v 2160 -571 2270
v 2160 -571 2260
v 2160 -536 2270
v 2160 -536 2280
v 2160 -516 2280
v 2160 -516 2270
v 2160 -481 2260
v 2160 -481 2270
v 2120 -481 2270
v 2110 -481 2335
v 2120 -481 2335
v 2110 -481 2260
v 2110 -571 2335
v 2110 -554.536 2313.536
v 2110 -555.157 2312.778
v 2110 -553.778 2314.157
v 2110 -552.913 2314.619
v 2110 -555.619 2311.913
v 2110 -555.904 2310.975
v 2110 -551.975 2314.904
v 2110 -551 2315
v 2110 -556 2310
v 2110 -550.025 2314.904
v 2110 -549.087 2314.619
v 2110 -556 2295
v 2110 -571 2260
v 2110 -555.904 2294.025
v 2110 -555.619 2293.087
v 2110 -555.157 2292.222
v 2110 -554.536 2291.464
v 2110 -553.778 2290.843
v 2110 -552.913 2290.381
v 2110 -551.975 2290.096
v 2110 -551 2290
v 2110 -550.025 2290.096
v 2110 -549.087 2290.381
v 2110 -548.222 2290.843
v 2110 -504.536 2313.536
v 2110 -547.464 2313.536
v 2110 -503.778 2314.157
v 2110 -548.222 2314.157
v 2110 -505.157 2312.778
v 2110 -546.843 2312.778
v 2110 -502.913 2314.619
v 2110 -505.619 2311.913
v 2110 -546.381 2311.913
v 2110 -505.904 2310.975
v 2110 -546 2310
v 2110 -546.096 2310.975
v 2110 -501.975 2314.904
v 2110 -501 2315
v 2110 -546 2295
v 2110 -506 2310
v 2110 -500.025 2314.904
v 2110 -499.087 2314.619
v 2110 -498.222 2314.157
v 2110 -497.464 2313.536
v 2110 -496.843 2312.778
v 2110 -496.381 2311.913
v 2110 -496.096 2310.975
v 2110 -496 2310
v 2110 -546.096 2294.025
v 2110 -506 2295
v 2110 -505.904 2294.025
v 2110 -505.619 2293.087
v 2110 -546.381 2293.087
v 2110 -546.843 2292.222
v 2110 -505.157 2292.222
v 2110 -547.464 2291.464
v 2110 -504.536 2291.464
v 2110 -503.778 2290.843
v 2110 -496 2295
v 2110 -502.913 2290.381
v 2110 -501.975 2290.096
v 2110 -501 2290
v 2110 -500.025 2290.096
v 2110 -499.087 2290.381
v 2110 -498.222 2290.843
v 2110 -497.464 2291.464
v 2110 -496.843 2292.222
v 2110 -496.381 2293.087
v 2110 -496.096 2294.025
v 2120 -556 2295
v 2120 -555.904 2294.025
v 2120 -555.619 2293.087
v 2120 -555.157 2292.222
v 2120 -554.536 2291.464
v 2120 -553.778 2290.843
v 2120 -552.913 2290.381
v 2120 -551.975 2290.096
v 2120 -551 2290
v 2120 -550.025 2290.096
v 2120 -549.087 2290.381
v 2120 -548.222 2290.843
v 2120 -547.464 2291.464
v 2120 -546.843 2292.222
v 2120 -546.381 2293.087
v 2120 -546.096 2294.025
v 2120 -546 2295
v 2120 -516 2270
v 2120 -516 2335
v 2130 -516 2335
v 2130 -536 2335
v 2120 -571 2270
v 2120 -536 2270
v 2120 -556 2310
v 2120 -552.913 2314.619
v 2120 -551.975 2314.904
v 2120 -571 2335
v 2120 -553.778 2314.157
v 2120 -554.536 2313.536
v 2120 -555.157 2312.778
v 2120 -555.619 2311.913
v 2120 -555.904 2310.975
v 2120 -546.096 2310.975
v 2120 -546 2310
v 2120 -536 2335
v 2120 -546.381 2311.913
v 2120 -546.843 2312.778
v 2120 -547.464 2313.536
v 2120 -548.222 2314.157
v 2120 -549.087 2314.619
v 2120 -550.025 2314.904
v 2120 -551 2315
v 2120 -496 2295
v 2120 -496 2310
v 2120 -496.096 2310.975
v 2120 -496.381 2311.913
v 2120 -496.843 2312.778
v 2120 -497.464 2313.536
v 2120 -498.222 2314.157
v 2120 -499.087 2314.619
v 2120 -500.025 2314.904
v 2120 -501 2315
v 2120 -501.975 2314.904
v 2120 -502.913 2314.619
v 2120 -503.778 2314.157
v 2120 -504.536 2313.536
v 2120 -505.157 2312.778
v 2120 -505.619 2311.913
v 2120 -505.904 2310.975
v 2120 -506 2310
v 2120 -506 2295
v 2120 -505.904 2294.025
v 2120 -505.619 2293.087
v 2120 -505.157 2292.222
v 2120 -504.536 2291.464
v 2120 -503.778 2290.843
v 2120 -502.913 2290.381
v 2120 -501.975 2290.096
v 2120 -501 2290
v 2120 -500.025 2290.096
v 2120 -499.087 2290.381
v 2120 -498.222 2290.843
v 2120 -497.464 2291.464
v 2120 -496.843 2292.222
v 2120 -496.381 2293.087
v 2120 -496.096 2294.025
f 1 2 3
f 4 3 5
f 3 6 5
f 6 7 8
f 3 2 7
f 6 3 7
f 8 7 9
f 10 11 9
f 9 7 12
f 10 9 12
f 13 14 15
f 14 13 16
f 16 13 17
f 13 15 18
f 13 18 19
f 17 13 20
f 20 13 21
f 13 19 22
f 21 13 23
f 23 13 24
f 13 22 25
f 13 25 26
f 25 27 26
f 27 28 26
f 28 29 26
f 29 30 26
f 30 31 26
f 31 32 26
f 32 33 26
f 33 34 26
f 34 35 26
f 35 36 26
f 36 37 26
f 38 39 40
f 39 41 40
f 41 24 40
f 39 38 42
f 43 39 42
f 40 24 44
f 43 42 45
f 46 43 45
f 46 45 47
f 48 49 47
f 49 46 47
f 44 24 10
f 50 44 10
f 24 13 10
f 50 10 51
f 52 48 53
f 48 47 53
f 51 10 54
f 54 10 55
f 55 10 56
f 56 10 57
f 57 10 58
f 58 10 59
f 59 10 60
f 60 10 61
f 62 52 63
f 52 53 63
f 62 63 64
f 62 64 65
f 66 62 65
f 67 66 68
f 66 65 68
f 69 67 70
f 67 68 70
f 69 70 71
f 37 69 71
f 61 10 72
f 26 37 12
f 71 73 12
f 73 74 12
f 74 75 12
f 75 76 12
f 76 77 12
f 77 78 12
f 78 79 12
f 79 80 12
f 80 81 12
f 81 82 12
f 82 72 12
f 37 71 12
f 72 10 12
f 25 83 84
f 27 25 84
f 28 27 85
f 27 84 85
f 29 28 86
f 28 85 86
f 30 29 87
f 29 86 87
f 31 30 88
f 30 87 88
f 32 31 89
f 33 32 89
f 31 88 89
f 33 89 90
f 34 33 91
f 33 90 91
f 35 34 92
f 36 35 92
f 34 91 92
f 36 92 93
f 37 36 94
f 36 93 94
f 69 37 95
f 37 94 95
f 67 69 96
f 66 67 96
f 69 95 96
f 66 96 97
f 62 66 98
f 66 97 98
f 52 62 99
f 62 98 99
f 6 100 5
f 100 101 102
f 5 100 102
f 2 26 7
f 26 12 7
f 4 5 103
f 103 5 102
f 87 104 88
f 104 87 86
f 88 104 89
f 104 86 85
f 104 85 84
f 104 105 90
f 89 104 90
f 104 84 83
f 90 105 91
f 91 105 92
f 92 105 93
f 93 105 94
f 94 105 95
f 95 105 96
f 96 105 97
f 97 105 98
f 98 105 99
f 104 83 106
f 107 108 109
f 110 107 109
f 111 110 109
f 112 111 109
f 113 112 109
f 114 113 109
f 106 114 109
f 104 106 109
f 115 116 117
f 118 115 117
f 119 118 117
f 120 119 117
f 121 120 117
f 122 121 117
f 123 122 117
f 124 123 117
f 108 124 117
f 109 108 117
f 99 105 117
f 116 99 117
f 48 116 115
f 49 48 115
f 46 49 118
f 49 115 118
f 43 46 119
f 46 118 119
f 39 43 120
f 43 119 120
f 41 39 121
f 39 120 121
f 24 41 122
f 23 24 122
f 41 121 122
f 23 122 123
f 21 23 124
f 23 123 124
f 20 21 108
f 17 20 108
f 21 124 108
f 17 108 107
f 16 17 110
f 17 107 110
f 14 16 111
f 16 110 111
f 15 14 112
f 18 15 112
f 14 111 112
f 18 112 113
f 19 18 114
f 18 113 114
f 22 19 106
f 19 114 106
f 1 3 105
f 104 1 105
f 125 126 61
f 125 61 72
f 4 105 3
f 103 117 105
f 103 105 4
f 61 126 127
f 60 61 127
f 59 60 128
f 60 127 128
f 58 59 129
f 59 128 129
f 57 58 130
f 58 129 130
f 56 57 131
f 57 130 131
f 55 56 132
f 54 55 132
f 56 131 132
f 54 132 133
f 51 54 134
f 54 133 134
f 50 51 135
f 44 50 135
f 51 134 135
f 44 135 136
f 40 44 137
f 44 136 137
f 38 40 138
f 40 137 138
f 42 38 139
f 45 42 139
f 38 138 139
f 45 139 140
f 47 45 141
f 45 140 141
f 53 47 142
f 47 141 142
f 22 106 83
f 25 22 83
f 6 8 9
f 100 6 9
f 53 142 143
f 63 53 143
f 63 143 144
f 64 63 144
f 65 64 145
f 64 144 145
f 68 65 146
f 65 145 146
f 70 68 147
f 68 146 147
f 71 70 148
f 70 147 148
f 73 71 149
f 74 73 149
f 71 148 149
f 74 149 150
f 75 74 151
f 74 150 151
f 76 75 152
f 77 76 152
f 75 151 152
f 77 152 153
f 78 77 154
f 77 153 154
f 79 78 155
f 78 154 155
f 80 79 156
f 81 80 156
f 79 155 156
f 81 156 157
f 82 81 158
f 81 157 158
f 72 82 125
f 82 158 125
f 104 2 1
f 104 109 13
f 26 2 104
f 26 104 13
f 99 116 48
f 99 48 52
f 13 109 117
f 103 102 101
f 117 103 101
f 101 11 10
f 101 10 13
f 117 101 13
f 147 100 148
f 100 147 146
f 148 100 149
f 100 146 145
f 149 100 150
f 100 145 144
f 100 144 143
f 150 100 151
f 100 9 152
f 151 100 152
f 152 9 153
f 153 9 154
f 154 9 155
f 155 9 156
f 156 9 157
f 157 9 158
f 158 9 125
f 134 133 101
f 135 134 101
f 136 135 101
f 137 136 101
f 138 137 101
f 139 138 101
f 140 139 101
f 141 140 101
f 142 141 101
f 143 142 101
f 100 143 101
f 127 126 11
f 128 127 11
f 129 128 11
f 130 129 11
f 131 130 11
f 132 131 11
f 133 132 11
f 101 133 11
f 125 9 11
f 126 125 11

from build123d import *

# Parameters (mm, degrees)
PAD005_DEPTH    = 45
POCKET002_DEPTH = 10.001
PAD006_DEPTH    = 10


with BuildPart() as part:
    # Sketch012 → Pad005 (new body, symmetric)
    with BuildSketch(Plane(origin=(0, -526, 0), x_dir=(1, 0, 0), z_dir=(0, 1, 0))):
        Polygon((2110, -2335), (2110, -2260), (2160, -2260), (2160, -2270), (2120, -2270), (2120, -2335), align=None)
    extrude(amount=PAD005_DEPTH, both=True)

    # Sketch013 (on Face5 of Pad005) → Pocket002 (cut, through all)
    with BuildSketch(Plane(origin=(2120, -526, 0), x_dir=(0, 0, -1), z_dir=(1, 0, 0))):
        with BuildLine():
            ThreePointArc((-2310, -20), (-2315, -25), (-2310, -30))
            Line((-2310, -30), (-2295, -30))
            ThreePointArc((-2295, -30), (-2290, -25), (-2295, -20))
            Line((-2310, -20), (-2295, -20))
        make_face()
        with BuildLine():
            ThreePointArc((-2310, 30), (-2315, 25), (-2310, 20))
            Line((-2310, 20), (-2295, 20))
            ThreePointArc((-2295, 20), (-2290, 25), (-2295, 30))
            Line((-2310, 30), (-2295, 30))
        make_face()
    extrude(amount=-POCKET002_DEPTH, mode=Mode.SUBTRACT)

    # Sketch003 (on DatumPlane) → Pad006 (join, symmetric)
    with BuildSketch(Plane(origin=(0, -526, 0), x_dir=(-1, 0, 0), z_dir=(0, 1, 0))):
        Polygon((-2160, 2270), (-2160, 2280), (-2130, 2335), (-2120, 2335), (-2120, 2270), align=None)
    extrude(amount=PAD006_DEPTH, both=True)


solid = part.part
